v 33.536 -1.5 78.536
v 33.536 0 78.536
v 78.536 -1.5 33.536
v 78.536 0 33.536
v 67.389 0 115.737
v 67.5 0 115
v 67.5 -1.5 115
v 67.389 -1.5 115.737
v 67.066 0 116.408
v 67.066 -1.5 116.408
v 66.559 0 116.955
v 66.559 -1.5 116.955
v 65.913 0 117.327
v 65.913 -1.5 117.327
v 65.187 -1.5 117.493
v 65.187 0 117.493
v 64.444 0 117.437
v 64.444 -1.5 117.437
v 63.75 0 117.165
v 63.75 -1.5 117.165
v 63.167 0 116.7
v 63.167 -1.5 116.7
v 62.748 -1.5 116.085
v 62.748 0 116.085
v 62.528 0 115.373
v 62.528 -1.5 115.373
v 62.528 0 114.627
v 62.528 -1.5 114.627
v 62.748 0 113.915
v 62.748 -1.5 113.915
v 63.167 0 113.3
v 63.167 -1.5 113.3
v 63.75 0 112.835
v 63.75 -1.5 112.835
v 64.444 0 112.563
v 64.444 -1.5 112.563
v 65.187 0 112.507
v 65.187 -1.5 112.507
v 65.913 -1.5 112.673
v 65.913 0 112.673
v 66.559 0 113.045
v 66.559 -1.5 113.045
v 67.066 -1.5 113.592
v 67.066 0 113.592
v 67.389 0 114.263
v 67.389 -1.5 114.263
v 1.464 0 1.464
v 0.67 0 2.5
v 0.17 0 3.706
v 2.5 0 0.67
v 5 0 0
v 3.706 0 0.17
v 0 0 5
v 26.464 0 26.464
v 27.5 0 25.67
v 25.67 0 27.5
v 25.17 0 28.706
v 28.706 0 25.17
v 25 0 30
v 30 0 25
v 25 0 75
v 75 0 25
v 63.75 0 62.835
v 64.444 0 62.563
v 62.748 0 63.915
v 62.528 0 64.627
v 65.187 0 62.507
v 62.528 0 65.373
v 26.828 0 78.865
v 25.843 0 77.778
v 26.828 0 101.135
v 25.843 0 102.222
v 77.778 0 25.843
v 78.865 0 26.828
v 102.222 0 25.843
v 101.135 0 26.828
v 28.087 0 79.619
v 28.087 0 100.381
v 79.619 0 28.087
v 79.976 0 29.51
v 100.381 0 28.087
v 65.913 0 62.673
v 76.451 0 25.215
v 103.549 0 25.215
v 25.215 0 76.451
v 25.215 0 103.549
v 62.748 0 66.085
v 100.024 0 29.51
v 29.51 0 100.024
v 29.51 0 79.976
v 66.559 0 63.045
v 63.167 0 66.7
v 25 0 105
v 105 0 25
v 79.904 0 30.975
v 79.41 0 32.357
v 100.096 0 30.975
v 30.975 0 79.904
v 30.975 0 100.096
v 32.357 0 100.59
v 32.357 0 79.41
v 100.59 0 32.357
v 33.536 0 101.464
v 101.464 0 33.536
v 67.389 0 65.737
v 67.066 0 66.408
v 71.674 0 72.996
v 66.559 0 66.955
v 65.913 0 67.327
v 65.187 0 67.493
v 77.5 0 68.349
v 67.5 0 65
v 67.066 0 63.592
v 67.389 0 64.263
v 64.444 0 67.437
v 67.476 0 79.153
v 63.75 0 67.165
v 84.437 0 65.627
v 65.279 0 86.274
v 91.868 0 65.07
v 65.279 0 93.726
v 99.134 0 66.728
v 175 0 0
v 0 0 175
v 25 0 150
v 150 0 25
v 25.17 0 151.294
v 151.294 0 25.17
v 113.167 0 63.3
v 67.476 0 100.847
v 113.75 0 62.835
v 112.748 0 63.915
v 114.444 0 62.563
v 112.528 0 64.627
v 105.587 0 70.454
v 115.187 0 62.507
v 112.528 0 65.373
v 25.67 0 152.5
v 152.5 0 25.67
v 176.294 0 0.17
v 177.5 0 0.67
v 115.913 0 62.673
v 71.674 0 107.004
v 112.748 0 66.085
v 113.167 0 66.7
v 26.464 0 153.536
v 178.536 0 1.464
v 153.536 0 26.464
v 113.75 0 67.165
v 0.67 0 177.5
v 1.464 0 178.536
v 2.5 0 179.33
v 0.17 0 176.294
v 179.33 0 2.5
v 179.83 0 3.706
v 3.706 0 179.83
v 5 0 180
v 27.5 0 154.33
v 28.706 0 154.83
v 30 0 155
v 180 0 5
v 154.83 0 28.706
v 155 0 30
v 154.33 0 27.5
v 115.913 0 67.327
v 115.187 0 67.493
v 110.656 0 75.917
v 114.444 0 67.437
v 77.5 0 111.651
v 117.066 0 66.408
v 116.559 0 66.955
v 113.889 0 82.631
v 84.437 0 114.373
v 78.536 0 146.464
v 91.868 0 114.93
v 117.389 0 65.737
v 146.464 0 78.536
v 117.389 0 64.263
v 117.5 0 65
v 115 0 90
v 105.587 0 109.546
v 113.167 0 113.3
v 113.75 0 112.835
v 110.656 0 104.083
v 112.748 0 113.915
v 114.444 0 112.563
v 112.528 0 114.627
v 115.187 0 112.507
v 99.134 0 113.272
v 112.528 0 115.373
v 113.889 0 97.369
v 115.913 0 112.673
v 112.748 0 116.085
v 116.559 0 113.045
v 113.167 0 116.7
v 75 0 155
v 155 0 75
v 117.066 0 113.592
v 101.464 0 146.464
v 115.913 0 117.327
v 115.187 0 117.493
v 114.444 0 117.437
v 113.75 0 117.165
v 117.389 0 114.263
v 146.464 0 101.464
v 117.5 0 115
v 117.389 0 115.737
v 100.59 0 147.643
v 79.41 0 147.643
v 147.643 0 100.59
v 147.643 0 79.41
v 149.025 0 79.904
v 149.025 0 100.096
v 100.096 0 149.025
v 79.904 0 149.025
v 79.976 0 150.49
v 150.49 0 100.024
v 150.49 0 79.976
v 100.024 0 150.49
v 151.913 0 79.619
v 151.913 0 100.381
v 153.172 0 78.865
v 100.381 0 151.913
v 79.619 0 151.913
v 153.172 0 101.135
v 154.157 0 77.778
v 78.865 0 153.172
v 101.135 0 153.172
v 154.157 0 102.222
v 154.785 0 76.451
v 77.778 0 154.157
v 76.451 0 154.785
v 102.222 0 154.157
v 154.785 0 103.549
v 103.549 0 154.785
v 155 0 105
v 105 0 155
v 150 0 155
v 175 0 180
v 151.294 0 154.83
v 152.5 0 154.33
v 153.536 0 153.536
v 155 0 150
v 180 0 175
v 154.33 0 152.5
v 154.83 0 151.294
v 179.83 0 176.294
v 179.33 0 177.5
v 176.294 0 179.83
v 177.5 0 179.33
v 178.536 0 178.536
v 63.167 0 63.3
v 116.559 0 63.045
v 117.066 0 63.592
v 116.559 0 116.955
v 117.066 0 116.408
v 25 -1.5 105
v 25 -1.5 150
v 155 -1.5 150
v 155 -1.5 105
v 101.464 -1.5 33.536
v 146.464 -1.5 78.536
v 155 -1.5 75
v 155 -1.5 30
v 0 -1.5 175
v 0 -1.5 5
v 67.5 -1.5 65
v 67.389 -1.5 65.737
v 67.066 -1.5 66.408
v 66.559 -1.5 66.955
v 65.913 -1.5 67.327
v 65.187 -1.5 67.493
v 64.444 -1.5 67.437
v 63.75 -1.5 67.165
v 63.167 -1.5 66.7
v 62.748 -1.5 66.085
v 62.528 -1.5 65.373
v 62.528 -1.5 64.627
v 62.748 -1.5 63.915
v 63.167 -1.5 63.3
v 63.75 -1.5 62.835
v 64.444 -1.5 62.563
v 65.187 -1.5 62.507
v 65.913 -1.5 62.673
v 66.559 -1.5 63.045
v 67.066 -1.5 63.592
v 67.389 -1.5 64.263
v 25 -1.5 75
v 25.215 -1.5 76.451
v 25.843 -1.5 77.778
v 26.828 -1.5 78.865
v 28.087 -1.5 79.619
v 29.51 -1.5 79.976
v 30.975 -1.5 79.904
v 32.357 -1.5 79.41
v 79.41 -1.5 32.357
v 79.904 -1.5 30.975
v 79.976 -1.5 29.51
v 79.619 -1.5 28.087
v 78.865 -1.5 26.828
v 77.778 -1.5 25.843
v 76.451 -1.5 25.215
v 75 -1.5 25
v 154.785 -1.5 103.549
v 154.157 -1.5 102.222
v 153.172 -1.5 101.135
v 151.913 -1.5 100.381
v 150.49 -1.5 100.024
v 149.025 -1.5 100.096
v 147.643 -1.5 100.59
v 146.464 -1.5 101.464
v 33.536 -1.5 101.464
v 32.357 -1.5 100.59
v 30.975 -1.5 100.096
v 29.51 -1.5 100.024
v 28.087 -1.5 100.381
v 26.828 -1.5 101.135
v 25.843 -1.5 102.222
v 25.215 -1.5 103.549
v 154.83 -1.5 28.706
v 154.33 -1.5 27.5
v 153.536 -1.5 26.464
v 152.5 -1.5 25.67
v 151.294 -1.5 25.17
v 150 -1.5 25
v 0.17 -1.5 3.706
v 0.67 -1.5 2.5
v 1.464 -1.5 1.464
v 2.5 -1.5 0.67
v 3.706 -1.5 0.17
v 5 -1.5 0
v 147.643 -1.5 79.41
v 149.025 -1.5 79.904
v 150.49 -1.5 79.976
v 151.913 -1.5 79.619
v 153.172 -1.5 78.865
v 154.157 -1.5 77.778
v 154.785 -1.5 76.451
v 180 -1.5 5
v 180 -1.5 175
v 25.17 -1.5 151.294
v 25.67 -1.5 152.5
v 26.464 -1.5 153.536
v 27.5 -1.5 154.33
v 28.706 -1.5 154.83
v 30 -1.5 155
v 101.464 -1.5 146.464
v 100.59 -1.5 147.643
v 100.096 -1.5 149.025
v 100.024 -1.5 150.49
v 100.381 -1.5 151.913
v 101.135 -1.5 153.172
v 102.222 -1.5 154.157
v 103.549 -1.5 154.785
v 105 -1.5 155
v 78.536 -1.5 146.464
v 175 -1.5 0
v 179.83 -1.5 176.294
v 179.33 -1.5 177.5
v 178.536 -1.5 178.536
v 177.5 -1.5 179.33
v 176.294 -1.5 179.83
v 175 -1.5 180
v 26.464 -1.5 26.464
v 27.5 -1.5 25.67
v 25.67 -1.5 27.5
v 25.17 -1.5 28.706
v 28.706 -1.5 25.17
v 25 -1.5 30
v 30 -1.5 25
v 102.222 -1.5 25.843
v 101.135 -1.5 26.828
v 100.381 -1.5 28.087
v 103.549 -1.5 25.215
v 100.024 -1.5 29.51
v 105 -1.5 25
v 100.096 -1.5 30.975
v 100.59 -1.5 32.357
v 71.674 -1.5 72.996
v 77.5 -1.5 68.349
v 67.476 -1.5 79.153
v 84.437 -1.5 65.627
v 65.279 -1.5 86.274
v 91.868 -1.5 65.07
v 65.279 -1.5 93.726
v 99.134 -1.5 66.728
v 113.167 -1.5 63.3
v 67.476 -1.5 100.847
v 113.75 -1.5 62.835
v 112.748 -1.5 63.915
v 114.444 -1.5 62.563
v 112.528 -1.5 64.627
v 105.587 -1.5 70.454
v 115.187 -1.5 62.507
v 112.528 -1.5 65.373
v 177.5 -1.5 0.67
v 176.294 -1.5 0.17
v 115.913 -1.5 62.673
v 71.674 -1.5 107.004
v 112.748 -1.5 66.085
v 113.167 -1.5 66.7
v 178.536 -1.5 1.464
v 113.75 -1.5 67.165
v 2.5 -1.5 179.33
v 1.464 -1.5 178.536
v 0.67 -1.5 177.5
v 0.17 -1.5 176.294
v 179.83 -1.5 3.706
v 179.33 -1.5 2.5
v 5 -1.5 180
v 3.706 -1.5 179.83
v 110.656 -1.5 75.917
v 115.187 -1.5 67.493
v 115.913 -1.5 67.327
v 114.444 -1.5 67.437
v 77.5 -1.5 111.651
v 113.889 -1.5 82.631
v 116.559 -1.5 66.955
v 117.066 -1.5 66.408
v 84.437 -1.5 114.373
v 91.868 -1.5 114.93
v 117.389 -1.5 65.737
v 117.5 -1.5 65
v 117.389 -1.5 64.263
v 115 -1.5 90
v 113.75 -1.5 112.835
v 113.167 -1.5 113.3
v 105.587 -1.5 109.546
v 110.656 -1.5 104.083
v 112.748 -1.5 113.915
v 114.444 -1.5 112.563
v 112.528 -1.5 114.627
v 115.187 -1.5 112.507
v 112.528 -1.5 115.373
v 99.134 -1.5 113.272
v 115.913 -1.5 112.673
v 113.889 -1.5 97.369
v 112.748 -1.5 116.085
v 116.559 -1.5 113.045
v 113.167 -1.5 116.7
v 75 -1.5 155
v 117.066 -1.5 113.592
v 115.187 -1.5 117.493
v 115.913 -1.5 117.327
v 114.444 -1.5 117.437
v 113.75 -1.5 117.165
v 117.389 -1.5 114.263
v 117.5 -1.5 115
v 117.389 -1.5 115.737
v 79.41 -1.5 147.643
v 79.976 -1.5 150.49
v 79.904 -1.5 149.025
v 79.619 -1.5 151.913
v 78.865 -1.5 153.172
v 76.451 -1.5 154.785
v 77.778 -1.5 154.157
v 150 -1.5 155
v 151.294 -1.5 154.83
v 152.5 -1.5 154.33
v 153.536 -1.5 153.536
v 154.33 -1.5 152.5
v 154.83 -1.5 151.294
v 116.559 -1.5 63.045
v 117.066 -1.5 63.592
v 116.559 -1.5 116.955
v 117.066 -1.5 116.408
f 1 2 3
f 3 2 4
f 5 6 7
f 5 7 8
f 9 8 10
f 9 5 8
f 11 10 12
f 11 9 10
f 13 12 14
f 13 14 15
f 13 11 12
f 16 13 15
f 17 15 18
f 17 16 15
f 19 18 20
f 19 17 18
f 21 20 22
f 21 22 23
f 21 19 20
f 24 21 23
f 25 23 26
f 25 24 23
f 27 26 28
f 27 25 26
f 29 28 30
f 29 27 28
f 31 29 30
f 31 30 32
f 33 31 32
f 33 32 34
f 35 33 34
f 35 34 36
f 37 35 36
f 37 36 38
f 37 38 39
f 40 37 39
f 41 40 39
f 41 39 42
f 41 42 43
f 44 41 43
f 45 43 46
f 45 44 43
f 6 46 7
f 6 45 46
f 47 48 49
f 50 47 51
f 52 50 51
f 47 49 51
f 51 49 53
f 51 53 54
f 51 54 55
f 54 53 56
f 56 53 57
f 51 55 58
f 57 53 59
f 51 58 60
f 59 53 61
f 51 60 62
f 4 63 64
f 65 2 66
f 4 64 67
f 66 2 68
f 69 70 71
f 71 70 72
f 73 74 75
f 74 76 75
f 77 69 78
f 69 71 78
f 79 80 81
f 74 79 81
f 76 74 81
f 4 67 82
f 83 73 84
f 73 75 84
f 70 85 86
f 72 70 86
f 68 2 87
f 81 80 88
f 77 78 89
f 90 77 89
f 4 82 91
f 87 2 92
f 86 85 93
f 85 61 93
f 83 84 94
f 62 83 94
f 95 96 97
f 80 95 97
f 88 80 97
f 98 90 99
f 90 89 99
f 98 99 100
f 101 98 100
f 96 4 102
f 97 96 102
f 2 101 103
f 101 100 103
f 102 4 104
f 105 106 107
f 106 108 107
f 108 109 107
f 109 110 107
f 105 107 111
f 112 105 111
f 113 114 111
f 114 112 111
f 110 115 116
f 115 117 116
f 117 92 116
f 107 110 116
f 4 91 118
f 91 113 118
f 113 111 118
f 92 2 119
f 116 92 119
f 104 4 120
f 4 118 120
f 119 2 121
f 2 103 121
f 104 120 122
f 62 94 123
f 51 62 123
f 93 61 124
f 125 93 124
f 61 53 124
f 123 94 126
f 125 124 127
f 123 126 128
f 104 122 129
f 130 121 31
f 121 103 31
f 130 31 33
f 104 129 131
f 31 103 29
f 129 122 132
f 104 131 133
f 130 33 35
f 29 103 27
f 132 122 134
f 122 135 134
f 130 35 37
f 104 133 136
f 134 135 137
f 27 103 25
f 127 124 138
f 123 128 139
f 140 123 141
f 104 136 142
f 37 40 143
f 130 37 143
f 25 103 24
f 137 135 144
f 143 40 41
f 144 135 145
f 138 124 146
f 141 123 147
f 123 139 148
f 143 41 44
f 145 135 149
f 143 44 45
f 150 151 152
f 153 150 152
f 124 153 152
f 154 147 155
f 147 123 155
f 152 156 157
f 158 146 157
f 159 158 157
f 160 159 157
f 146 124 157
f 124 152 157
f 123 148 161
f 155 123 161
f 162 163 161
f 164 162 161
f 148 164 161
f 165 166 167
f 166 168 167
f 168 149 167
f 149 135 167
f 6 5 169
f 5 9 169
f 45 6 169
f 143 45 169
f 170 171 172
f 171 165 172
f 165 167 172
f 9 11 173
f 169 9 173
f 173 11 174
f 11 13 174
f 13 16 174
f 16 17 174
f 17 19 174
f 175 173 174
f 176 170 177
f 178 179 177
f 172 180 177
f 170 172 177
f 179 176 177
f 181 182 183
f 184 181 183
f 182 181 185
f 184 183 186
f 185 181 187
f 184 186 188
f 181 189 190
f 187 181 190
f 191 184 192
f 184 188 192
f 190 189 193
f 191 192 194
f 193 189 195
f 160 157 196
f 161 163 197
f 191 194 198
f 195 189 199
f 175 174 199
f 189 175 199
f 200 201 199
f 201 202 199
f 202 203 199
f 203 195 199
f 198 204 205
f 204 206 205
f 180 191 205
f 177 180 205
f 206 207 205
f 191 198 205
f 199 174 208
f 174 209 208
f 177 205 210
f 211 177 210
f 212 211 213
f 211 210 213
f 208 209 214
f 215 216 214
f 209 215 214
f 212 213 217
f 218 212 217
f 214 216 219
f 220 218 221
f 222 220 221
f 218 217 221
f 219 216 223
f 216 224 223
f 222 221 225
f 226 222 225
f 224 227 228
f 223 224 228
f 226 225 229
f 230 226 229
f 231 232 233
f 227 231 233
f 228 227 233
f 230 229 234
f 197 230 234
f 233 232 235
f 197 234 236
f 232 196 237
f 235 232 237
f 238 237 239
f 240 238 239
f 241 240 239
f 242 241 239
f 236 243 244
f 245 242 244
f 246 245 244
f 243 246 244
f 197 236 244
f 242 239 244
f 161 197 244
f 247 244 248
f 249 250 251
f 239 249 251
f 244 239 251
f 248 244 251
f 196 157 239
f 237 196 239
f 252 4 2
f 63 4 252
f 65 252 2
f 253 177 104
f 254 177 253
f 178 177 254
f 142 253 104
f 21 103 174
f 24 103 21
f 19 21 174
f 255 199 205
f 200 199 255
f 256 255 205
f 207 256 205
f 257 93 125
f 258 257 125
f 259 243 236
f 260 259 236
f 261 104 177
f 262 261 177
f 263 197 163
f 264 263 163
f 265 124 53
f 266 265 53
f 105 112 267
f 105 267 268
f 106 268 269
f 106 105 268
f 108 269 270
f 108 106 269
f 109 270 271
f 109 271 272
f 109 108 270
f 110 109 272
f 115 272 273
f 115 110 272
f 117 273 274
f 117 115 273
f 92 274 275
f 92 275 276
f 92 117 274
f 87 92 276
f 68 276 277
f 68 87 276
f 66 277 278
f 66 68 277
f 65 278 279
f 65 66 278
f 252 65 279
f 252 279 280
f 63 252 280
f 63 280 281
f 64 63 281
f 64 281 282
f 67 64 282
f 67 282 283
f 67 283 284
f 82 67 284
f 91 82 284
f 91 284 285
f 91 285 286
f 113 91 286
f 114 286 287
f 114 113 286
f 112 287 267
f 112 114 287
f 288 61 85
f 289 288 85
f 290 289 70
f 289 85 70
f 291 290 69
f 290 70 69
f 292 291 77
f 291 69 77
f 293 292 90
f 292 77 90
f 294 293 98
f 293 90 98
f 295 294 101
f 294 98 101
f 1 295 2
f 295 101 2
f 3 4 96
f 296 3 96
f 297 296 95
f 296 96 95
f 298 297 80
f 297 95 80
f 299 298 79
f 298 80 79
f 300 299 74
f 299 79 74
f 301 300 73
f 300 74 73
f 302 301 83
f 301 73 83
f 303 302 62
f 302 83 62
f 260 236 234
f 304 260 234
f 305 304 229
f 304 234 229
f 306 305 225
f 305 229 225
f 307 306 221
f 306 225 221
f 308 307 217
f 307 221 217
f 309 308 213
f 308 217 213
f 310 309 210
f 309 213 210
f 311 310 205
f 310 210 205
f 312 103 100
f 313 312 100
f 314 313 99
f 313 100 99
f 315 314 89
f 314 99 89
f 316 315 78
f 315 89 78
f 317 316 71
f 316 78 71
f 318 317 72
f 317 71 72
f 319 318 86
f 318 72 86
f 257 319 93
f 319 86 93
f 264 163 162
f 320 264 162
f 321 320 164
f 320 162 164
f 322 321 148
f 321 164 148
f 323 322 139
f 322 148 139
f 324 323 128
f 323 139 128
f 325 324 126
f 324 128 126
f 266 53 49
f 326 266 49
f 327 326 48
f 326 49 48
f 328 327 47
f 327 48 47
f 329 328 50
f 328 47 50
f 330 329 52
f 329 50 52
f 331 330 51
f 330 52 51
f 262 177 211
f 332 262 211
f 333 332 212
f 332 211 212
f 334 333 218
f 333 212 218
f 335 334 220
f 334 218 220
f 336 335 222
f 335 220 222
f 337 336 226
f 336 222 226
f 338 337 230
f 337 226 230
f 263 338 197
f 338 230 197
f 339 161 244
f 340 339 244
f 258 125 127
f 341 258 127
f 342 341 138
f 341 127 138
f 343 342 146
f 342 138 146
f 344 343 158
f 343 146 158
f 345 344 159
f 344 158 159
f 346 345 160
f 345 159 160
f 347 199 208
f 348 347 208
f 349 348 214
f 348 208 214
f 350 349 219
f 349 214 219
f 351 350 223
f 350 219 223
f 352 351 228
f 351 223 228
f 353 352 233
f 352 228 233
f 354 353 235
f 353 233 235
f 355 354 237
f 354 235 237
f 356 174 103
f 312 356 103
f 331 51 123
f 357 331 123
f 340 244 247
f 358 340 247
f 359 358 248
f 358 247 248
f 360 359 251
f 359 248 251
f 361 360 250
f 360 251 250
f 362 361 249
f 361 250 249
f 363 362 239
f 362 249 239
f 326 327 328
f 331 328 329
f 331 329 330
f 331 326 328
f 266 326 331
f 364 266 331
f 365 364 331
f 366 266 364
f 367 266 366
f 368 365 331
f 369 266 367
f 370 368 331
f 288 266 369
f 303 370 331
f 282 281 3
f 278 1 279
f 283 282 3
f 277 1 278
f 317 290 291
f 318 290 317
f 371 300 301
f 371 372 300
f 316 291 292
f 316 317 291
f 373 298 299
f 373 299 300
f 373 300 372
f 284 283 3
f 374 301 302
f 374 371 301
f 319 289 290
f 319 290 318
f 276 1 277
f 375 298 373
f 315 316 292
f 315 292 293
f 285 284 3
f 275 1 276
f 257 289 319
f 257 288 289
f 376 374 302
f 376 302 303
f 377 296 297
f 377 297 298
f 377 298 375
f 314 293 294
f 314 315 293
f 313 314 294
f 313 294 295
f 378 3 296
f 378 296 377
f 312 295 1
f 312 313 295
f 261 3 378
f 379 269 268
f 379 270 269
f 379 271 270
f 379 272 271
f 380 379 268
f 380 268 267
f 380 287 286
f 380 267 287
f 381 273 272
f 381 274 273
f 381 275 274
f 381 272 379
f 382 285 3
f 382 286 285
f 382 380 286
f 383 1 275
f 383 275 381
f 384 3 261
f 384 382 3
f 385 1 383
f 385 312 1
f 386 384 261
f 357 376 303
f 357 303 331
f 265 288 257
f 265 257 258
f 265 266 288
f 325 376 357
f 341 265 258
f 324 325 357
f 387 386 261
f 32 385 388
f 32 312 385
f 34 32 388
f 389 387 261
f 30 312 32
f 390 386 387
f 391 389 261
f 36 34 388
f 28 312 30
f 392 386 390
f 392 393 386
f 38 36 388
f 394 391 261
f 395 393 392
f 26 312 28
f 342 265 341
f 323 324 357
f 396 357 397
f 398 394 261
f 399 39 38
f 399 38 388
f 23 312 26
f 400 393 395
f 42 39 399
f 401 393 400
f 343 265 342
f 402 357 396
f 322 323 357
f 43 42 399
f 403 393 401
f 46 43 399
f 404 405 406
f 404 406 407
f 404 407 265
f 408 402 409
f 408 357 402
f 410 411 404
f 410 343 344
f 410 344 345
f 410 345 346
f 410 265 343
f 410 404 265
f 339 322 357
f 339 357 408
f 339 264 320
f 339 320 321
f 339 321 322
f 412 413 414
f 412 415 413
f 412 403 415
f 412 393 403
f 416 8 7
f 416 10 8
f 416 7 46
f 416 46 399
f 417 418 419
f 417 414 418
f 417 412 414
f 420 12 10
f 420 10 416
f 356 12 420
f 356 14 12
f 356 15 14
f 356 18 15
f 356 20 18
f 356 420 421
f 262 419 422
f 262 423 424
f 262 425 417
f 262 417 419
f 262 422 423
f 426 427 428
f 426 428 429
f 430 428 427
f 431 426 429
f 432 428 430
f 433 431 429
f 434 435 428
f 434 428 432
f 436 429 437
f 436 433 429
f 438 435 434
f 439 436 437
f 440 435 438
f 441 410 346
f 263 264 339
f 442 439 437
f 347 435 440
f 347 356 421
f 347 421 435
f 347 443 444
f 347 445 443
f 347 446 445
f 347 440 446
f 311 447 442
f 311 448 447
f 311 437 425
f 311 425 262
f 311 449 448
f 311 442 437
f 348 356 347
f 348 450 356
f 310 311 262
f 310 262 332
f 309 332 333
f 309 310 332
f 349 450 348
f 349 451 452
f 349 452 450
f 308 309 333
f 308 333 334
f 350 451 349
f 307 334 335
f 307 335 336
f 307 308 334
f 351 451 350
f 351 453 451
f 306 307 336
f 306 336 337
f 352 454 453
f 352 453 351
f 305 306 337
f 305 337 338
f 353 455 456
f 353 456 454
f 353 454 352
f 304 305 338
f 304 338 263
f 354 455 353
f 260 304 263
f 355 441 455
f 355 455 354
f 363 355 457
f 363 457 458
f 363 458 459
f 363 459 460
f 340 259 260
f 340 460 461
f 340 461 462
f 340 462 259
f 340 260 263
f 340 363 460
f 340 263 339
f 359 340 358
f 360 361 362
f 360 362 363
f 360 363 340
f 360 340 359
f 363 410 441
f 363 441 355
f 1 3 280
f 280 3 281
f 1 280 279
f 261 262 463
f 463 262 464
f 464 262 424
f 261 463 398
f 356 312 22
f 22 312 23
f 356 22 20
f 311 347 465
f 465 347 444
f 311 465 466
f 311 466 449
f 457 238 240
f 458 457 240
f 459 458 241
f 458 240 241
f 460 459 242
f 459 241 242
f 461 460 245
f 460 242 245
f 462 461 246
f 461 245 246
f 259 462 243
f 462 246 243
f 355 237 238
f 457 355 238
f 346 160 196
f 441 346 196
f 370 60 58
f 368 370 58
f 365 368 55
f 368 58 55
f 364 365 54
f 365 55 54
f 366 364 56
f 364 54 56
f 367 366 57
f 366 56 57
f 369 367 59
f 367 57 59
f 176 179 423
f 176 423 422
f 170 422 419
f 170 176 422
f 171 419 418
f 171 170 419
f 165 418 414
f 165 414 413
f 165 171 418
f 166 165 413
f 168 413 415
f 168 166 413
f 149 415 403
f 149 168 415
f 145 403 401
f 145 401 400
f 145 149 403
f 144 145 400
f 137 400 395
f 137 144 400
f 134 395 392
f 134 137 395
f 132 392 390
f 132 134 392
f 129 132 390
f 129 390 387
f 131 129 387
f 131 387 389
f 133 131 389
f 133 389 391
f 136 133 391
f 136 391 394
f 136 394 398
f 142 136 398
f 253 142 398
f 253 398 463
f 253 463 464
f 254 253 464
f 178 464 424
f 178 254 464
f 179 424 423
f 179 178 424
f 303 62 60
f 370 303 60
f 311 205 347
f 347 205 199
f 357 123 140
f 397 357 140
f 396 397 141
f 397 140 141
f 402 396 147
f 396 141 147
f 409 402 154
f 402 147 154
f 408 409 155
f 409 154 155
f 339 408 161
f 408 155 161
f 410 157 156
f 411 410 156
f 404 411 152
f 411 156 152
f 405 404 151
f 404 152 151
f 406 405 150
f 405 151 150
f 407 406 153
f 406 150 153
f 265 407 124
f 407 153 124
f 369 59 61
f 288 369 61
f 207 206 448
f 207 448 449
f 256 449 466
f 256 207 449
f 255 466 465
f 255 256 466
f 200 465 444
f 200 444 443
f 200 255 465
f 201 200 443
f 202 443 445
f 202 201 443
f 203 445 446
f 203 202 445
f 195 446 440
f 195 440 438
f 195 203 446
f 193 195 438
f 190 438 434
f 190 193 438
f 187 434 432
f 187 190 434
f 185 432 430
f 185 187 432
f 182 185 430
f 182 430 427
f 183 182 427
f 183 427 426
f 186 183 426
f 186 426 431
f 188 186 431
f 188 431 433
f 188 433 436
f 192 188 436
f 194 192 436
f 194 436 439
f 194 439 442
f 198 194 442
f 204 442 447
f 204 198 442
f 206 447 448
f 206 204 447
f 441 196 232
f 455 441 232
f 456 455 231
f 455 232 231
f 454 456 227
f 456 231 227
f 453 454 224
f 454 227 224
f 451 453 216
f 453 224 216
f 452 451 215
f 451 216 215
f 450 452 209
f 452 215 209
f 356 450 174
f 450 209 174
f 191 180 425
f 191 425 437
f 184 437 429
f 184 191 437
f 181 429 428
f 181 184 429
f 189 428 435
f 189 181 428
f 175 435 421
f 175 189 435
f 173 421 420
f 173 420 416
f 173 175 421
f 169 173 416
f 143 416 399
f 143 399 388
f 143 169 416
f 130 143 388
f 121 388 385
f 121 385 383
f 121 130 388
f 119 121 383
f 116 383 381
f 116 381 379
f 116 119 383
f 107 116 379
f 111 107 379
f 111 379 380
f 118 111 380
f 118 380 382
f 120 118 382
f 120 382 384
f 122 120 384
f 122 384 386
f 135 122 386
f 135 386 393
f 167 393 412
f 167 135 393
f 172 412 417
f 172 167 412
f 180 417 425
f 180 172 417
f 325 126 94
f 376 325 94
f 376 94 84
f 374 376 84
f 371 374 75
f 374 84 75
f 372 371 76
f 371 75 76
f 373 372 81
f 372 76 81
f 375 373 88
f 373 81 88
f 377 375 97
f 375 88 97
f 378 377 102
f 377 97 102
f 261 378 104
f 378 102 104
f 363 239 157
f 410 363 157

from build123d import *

# Parameters (mm, degrees)
F0_R     = 2.5
F0_R_2   = 25
F1_DEPTH = 1.5


with BuildPart() as f1:
    # F0 (on Front) → F1 (new body)
    with BuildSketch(Plane.XZ):
        with BuildLine():
            ThreePointArc((0, 5), (1.464466, 1.464466), (5, 0))
            Line((5, 0), (175, 0))
            ThreePointArc((175, 0), (178.535534, 1.464466), (180, 5))
            Line((180, 5), (180, 175))
            ThreePointArc((180, 175), (178.535534, 178.535534), (175, 180))
            Line((175, 180), (5, 180))
            ThreePointArc((5, 180), (1.464466, 178.535534), (0, 175))
            Line((0, 175), (0, 5))
        make_face()
        with BuildLine():
            ThreePointArc((25, 75), (28.086583, 79.619398), (33.535534, 78.535534))
            Line((33.535534, 78.535534), (78.535534, 33.535534))
            ThreePointArc((78.535534, 33.535534), (79.619398, 28.086583), (75, 25))
            Line((75, 25), (30, 25))
            ThreePointArc((30, 25), (26.464466, 26.464466), (25, 30))
            Line((25, 30), (25, 75))
        make_face(mode=Mode.SUBTRACT)
        with Locations((65, 65)):
            Circle(F0_R, mode=Mode.SUBTRACT)
        with BuildLine():
            Line((101.464466, 33.535534), (146.464466, 78.535534))
            ThreePointArc((146.464466, 78.535534), (151.913417, 79.619398), (155, 75))
            Line((155, 75), (155, 30))
            ThreePointArc((155, 30), (153.535534, 26.464466), (150, 25))
            Line((150, 25), (105, 25))
            ThreePointArc((105, 25), (100.380602, 28.086583), (101.464466, 33.535534))
        make_face(mode=Mode.SUBTRACT)
        with Locations((115, 65)):
            Circle(F0_R, mode=Mode.SUBTRACT)
        with Locations((65, 115)):
            Circle(F0_R, mode=Mode.SUBTRACT)
        with BuildLine():
            ThreePointArc((25, 150), (26.464466, 153.535534), (30, 155))
            Line((30, 155), (75, 155))
            ThreePointArc((75, 155), (79.619398, 151.913417), (78.535534, 146.464466))
            Line((78.535534, 146.464466), (33.535534, 101.464466))
            ThreePointArc((33.535534, 101.464466), (28.086583, 100.380602), (25, 105))
            Line((25, 105), (25, 150))
        make_face(mode=Mode.SUBTRACT)
        with Locations((90, 90)):
            Circle(F0_R_2, mode=Mode.SUBTRACT)
        with Locations((115, 115)):
            Circle(F0_R, mode=Mode.SUBTRACT)
        with BuildLine():
            ThreePointArc((155, 105), (151.913417, 100.380602), (146.464466, 101.464466))
            Line((146.464466, 101.464466), (101.464466, 146.464466))
            ThreePointArc((101.464466, 146.464466), (100.380602, 151.913417), (105, 155))
            Line((105, 155), (150, 155))
            ThreePointArc((150, 155), (153.535534, 153.535534), (155, 150))
            Line((155, 150), (155, 105))
        make_face(mode=Mode.SUBTRACT)
    extrude(amount=F1_DEPTH)


solid = f1.part
